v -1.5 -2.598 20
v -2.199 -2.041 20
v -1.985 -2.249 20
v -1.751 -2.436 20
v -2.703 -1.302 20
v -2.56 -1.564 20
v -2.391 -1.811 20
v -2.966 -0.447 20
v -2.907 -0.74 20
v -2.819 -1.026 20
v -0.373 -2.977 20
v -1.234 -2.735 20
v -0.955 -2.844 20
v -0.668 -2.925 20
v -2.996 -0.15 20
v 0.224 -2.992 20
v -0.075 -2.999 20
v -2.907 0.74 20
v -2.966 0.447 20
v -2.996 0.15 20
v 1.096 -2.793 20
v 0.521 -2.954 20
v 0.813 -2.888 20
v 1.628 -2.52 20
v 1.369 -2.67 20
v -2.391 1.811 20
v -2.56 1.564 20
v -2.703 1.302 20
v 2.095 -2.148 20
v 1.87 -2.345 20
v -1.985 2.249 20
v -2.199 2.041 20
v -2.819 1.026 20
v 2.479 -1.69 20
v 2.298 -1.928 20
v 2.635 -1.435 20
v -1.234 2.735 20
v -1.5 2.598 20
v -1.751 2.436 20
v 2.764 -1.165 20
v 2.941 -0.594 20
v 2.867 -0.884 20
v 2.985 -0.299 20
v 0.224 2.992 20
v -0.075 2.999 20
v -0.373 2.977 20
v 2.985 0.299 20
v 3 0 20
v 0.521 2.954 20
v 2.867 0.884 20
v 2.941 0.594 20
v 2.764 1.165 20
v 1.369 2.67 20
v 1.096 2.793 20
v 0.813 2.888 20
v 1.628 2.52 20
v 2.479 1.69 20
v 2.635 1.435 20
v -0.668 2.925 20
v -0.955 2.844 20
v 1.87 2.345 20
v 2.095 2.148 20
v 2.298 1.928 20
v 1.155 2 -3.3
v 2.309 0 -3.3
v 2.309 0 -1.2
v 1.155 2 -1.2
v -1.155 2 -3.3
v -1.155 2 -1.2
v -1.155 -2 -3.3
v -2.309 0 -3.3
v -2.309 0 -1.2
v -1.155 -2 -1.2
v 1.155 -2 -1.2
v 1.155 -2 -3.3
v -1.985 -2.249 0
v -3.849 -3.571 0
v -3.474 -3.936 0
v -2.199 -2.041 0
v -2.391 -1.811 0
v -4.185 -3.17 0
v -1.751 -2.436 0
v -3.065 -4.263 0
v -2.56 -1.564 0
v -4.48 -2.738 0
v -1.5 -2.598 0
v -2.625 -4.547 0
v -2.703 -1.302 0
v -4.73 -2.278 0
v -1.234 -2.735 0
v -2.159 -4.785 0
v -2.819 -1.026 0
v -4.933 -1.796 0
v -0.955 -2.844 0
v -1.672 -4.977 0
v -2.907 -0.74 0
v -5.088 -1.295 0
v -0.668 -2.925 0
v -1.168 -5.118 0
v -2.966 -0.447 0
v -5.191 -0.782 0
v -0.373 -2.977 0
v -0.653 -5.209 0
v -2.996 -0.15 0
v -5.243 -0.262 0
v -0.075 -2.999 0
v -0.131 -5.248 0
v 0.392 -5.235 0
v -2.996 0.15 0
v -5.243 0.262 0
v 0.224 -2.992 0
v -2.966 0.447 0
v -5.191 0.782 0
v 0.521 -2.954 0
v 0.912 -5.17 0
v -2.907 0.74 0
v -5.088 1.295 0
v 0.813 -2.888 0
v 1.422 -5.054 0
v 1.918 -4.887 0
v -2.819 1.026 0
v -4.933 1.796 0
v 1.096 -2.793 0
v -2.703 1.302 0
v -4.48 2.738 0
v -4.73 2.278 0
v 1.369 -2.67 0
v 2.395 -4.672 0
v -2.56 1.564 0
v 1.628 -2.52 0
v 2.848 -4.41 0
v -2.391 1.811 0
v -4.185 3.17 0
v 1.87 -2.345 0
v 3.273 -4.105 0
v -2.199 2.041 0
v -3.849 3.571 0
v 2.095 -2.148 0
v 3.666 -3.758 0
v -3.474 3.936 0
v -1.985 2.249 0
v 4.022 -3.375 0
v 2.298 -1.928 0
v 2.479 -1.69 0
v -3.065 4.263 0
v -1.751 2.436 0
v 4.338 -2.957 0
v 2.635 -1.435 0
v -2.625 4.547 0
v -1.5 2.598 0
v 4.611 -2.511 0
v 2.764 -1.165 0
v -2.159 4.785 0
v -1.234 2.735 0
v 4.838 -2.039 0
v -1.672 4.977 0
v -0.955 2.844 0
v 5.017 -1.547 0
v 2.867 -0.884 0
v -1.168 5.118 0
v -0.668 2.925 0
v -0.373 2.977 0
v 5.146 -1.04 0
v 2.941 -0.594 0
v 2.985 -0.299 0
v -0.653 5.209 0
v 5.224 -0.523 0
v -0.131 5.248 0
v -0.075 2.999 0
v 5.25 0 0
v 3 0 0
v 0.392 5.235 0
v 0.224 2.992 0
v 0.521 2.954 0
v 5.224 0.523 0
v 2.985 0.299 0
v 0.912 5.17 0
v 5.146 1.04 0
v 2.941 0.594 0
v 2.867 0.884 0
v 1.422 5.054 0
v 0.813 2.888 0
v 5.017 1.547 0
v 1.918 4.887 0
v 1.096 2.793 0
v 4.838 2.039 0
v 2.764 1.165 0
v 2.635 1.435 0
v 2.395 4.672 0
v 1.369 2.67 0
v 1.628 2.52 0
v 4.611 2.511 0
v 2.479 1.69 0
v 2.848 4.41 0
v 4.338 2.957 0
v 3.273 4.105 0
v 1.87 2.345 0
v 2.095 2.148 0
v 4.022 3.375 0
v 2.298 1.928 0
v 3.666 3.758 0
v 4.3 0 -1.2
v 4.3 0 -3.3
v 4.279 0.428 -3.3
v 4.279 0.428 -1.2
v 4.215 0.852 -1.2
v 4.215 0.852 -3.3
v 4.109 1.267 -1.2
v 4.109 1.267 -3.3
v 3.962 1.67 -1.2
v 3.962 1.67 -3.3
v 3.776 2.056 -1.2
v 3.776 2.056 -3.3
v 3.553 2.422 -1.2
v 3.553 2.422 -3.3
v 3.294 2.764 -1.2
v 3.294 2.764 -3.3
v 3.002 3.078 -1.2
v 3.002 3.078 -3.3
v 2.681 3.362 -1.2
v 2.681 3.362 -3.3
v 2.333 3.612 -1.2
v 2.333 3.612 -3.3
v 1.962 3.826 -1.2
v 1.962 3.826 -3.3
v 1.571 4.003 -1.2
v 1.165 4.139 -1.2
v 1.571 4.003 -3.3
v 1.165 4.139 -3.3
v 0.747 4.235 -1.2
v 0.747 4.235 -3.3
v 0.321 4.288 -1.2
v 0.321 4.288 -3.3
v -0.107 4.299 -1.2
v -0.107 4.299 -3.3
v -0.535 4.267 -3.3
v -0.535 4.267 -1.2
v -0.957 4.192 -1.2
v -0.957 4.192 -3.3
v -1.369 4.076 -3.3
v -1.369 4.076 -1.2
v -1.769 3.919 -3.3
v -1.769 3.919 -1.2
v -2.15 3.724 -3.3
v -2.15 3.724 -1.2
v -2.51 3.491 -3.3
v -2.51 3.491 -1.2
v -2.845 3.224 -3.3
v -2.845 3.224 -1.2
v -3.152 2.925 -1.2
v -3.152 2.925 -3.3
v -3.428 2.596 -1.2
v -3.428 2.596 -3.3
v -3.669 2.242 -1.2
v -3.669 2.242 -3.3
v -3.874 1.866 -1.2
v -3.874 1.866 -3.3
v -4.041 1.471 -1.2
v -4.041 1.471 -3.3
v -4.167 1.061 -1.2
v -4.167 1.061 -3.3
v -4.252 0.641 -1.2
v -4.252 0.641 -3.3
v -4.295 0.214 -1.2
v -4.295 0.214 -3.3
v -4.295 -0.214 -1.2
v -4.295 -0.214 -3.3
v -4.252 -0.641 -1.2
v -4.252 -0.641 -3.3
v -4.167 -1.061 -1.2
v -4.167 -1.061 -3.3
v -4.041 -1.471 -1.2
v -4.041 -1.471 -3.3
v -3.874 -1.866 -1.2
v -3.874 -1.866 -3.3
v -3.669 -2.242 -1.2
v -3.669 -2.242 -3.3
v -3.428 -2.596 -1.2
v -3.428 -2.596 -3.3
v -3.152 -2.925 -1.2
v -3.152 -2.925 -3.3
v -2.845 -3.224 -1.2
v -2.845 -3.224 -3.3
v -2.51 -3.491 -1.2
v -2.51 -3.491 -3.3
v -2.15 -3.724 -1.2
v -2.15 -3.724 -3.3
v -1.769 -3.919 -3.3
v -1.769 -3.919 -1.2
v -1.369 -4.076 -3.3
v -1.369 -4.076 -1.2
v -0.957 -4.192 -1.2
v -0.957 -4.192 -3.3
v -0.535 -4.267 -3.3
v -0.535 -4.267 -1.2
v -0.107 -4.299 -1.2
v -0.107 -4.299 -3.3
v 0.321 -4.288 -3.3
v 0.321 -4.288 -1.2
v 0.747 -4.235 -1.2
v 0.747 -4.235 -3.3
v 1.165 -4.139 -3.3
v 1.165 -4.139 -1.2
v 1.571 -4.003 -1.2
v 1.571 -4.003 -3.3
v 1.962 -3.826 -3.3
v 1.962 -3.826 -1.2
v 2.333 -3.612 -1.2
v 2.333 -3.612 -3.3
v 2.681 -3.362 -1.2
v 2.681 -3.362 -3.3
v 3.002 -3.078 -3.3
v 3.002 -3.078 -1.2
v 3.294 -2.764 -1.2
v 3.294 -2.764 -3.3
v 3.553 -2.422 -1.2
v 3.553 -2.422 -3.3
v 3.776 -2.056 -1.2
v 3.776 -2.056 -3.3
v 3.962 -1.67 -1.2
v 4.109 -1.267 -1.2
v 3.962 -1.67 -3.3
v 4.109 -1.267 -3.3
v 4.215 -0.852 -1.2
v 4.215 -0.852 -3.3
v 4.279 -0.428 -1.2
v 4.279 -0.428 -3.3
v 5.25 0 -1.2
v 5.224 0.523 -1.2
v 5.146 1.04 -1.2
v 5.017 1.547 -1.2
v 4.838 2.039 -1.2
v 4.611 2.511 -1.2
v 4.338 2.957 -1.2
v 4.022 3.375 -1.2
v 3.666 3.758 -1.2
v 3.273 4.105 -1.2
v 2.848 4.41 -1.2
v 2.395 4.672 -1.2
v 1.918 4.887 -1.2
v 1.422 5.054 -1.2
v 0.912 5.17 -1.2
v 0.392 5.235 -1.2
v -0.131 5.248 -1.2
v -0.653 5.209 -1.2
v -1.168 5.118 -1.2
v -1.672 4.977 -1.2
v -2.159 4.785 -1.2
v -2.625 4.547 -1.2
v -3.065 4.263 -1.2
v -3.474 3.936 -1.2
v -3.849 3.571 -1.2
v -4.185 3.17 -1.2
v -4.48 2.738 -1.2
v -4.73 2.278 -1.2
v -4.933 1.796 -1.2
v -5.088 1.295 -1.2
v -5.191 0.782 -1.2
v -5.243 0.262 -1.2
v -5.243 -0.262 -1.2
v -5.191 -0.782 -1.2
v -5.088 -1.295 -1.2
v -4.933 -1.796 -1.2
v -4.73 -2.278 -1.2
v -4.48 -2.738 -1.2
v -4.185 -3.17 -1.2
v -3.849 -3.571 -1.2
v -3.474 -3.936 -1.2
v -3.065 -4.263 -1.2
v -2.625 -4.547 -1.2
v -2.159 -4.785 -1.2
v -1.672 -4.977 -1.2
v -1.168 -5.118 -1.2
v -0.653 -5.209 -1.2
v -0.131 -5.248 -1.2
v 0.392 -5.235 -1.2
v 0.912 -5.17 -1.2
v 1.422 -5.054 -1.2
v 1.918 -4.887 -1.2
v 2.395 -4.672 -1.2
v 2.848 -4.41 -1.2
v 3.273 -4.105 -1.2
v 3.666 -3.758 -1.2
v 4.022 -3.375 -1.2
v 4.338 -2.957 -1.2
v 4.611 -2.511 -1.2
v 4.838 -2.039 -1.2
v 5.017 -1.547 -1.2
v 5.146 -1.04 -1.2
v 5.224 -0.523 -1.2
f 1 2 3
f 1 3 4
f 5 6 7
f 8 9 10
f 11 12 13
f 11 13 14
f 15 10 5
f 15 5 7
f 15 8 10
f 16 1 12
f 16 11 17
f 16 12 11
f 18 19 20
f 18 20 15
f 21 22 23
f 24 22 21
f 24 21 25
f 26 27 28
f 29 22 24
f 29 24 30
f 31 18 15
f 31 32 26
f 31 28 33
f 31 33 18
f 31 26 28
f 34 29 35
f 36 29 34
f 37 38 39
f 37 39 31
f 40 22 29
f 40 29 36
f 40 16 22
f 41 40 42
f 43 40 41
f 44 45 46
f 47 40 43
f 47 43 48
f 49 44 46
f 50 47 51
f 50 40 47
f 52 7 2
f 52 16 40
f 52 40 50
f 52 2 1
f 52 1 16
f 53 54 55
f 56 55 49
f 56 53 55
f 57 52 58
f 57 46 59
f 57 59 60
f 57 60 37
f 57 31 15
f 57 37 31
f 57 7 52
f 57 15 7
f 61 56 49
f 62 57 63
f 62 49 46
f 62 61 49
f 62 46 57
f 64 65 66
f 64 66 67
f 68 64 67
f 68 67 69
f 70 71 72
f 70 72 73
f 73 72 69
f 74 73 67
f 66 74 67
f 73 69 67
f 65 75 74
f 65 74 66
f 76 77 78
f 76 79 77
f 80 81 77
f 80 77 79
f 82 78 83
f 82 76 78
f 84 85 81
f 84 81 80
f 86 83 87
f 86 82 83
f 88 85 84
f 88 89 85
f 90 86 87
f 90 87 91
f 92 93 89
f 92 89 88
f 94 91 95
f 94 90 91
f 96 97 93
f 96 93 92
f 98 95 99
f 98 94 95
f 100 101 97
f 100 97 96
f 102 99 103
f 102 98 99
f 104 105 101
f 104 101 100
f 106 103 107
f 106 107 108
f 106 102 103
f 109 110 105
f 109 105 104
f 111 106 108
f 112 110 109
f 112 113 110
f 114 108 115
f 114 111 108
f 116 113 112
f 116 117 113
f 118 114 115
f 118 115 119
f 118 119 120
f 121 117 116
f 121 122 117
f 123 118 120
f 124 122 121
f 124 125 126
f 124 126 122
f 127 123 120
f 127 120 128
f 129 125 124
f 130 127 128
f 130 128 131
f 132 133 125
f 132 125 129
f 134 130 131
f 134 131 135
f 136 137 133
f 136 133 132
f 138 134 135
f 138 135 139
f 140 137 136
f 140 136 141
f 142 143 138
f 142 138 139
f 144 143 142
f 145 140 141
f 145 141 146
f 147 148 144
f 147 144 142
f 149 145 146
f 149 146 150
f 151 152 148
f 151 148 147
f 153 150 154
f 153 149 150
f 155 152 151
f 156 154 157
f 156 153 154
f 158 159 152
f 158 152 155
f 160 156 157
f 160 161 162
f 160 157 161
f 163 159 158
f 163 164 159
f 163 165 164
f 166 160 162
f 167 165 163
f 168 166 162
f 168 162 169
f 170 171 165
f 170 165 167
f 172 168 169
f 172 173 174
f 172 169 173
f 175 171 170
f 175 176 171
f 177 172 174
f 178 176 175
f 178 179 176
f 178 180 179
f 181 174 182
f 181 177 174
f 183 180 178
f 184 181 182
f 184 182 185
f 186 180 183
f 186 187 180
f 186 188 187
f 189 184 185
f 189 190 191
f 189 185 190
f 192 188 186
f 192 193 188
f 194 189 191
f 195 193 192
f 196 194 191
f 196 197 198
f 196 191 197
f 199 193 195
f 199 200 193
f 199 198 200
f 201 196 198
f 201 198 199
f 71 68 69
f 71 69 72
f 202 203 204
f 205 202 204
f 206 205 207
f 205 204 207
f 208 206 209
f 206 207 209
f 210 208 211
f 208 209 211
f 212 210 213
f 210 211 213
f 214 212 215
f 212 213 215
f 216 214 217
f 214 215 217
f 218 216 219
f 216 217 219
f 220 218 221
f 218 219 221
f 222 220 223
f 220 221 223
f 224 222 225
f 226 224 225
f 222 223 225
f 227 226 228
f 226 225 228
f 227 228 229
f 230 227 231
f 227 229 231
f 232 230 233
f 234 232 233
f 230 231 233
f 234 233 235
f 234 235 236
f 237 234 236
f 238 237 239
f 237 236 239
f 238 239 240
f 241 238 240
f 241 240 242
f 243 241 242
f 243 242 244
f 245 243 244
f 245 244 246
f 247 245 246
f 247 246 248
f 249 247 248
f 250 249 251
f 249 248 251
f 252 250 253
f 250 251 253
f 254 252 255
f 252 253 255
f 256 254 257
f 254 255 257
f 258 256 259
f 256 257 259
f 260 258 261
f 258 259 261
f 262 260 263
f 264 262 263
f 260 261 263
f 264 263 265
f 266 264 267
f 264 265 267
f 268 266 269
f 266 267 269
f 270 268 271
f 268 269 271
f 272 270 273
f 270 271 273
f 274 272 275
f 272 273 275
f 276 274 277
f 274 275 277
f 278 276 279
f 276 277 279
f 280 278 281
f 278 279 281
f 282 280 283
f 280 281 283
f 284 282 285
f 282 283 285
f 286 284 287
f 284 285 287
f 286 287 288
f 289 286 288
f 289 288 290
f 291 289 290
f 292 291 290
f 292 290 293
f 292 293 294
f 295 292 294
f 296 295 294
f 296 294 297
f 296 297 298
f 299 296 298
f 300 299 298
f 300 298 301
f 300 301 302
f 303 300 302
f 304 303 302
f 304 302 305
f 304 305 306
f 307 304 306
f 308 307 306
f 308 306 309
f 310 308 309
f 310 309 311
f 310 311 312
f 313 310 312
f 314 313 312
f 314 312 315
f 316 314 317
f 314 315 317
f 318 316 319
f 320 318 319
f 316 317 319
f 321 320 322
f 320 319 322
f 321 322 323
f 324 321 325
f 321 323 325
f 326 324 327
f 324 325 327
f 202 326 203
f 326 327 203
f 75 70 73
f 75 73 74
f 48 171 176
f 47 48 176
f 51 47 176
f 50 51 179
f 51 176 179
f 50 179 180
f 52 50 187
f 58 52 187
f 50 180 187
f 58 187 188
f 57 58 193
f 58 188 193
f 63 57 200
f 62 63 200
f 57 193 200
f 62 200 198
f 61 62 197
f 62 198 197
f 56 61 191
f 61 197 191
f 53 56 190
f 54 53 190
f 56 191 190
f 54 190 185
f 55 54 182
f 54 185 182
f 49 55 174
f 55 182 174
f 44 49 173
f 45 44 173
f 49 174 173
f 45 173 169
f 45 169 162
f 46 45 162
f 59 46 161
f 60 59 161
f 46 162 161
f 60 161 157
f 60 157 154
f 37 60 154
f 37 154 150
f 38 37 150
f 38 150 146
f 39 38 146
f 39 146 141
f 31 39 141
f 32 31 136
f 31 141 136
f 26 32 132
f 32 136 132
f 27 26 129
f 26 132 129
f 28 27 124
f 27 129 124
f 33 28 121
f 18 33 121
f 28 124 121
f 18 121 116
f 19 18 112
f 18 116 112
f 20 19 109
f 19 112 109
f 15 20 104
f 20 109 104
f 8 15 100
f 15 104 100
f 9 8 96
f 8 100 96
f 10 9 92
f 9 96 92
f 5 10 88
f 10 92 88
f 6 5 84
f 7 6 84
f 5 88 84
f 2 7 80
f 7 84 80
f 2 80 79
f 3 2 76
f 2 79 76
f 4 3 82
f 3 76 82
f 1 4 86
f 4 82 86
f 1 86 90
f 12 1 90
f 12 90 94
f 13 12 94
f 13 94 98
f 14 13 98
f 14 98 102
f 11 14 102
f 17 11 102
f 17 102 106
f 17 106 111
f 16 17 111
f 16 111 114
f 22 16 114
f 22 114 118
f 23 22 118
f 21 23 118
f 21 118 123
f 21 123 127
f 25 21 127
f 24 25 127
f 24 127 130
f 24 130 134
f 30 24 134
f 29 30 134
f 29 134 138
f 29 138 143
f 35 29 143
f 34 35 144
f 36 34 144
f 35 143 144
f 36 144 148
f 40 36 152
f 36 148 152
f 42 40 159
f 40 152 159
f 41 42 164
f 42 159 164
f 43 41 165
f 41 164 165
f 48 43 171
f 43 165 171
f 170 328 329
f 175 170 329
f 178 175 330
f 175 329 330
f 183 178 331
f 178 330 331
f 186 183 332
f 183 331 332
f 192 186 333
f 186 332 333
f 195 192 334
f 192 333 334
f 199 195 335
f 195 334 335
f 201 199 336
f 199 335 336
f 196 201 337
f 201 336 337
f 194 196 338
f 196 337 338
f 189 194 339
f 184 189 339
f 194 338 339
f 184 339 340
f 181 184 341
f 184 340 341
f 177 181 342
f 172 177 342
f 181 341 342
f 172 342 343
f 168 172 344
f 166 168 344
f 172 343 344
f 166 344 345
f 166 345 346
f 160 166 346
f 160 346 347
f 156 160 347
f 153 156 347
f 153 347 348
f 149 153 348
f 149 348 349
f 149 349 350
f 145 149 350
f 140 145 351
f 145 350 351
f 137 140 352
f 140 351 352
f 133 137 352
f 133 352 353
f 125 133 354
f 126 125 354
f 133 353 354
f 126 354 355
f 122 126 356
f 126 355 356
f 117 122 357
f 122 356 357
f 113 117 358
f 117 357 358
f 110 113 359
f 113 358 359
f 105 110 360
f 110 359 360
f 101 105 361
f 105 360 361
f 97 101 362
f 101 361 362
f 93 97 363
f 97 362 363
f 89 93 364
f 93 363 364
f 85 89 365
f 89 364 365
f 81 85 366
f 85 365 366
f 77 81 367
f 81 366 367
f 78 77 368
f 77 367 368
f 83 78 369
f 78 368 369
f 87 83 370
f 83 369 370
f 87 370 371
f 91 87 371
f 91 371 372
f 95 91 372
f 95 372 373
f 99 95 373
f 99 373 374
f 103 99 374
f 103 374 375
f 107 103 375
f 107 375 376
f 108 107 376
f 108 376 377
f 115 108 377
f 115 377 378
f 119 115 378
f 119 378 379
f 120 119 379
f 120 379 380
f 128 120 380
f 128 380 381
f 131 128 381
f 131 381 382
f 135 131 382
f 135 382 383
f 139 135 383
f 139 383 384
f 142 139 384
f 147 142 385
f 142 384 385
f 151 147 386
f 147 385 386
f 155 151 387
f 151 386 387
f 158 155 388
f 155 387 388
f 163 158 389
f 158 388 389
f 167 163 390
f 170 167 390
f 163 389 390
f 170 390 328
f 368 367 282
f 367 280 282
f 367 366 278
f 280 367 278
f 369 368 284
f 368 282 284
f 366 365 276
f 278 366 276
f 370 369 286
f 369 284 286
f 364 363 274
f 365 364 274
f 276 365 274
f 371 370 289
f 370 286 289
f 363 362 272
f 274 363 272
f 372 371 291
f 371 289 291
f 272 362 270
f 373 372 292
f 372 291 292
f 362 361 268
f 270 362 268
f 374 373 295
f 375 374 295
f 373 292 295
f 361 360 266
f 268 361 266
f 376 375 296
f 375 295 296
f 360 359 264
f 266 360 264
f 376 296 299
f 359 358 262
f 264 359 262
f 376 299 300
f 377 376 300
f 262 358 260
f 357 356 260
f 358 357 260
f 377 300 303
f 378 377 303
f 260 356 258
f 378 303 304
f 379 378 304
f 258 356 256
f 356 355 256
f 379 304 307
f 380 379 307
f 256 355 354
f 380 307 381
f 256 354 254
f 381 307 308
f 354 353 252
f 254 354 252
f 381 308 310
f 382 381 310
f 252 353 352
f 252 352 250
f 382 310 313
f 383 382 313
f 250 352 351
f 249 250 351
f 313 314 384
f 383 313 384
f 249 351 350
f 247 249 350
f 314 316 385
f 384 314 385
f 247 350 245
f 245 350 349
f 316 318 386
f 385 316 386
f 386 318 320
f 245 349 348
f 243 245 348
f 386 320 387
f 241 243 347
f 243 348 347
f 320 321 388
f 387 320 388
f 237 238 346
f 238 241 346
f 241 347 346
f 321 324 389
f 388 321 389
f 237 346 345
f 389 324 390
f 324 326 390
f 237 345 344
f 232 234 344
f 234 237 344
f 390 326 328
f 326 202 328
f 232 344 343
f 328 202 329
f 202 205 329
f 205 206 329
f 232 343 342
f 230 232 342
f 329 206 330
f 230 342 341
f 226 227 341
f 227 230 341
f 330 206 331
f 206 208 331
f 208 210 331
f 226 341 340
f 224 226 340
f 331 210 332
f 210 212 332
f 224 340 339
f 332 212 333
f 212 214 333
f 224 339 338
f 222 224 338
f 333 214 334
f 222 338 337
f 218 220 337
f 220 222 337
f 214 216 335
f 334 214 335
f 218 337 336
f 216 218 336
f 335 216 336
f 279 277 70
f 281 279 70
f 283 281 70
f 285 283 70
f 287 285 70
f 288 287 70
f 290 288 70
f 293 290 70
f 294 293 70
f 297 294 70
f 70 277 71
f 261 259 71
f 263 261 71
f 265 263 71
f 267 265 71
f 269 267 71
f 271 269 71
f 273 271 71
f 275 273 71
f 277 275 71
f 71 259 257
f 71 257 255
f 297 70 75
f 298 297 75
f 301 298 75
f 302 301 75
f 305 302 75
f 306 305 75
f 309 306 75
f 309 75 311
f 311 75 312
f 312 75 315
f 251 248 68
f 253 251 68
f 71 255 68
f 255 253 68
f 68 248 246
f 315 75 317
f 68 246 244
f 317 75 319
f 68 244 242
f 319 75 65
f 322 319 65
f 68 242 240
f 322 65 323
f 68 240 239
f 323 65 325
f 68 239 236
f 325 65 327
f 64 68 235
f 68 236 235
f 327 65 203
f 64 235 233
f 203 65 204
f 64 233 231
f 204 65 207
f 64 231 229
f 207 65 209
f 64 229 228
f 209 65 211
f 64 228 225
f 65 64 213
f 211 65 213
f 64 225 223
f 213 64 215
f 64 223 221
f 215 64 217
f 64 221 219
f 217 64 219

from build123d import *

# Parameters (mm, degrees)
S01_M6_SHANK_R                   = 3
F_01_M6_SHANK_DEPTH              = 20
F_02_START                       = -1.2
S02_HEAD_SEATING_DIAMETER_R      = 5.25
F_02_HEAD_SEATING_DIAMETER_DEPTH = 1.2
F_03_START                       = -3.3
S03_BUTTON_CROWN_R               = 4.3
F_03_BUTTON_CROWN_DEPTH          = 2.1
F_04_START                       = -3.4
F_04_4_MM_HEX_KEY_DEPTH          = 2.2


with BuildPart() as part:
    # S01 - M6 shank → 01 - M6 shank (new body)
    with BuildSketch(Plane.XY):
        Circle(S01_M6_SHANK_R)
    extrude(amount=F_01_M6_SHANK_DEPTH)

    # S02 - Head seating diameter → 02 - Head seating diameter (add)
    with BuildSketch(Plane.XY.offset(F_02_START)):
        Circle(S02_HEAD_SEATING_DIAMETER_R)
    extrude(amount=F_02_HEAD_SEATING_DIAMETER_DEPTH)

    # S03 - Button crown → 03 - Button crown (add)
    with BuildSketch(Plane.XY.offset(F_03_START)):
        Circle(S03_BUTTON_CROWN_R)
    extrude(amount=F_03_BUTTON_CROWN_DEPTH)

    # S04 - 4 mm hex key → 04 - 4 mm hex key (cut)
    with BuildSketch(Plane.XY.offset(F_04_START)):
        Polygon((2.309401077, 0), (1.154700538, 2), (-1.154700538, 2), (-2.309401077, 0), (-1.154700538, -2), (1.154700538, -2), align=None)
    extrude(amount=F_04_4_MM_HEX_KEY_DEPTH, mode=Mode.SUBTRACT)


solid = part.part
